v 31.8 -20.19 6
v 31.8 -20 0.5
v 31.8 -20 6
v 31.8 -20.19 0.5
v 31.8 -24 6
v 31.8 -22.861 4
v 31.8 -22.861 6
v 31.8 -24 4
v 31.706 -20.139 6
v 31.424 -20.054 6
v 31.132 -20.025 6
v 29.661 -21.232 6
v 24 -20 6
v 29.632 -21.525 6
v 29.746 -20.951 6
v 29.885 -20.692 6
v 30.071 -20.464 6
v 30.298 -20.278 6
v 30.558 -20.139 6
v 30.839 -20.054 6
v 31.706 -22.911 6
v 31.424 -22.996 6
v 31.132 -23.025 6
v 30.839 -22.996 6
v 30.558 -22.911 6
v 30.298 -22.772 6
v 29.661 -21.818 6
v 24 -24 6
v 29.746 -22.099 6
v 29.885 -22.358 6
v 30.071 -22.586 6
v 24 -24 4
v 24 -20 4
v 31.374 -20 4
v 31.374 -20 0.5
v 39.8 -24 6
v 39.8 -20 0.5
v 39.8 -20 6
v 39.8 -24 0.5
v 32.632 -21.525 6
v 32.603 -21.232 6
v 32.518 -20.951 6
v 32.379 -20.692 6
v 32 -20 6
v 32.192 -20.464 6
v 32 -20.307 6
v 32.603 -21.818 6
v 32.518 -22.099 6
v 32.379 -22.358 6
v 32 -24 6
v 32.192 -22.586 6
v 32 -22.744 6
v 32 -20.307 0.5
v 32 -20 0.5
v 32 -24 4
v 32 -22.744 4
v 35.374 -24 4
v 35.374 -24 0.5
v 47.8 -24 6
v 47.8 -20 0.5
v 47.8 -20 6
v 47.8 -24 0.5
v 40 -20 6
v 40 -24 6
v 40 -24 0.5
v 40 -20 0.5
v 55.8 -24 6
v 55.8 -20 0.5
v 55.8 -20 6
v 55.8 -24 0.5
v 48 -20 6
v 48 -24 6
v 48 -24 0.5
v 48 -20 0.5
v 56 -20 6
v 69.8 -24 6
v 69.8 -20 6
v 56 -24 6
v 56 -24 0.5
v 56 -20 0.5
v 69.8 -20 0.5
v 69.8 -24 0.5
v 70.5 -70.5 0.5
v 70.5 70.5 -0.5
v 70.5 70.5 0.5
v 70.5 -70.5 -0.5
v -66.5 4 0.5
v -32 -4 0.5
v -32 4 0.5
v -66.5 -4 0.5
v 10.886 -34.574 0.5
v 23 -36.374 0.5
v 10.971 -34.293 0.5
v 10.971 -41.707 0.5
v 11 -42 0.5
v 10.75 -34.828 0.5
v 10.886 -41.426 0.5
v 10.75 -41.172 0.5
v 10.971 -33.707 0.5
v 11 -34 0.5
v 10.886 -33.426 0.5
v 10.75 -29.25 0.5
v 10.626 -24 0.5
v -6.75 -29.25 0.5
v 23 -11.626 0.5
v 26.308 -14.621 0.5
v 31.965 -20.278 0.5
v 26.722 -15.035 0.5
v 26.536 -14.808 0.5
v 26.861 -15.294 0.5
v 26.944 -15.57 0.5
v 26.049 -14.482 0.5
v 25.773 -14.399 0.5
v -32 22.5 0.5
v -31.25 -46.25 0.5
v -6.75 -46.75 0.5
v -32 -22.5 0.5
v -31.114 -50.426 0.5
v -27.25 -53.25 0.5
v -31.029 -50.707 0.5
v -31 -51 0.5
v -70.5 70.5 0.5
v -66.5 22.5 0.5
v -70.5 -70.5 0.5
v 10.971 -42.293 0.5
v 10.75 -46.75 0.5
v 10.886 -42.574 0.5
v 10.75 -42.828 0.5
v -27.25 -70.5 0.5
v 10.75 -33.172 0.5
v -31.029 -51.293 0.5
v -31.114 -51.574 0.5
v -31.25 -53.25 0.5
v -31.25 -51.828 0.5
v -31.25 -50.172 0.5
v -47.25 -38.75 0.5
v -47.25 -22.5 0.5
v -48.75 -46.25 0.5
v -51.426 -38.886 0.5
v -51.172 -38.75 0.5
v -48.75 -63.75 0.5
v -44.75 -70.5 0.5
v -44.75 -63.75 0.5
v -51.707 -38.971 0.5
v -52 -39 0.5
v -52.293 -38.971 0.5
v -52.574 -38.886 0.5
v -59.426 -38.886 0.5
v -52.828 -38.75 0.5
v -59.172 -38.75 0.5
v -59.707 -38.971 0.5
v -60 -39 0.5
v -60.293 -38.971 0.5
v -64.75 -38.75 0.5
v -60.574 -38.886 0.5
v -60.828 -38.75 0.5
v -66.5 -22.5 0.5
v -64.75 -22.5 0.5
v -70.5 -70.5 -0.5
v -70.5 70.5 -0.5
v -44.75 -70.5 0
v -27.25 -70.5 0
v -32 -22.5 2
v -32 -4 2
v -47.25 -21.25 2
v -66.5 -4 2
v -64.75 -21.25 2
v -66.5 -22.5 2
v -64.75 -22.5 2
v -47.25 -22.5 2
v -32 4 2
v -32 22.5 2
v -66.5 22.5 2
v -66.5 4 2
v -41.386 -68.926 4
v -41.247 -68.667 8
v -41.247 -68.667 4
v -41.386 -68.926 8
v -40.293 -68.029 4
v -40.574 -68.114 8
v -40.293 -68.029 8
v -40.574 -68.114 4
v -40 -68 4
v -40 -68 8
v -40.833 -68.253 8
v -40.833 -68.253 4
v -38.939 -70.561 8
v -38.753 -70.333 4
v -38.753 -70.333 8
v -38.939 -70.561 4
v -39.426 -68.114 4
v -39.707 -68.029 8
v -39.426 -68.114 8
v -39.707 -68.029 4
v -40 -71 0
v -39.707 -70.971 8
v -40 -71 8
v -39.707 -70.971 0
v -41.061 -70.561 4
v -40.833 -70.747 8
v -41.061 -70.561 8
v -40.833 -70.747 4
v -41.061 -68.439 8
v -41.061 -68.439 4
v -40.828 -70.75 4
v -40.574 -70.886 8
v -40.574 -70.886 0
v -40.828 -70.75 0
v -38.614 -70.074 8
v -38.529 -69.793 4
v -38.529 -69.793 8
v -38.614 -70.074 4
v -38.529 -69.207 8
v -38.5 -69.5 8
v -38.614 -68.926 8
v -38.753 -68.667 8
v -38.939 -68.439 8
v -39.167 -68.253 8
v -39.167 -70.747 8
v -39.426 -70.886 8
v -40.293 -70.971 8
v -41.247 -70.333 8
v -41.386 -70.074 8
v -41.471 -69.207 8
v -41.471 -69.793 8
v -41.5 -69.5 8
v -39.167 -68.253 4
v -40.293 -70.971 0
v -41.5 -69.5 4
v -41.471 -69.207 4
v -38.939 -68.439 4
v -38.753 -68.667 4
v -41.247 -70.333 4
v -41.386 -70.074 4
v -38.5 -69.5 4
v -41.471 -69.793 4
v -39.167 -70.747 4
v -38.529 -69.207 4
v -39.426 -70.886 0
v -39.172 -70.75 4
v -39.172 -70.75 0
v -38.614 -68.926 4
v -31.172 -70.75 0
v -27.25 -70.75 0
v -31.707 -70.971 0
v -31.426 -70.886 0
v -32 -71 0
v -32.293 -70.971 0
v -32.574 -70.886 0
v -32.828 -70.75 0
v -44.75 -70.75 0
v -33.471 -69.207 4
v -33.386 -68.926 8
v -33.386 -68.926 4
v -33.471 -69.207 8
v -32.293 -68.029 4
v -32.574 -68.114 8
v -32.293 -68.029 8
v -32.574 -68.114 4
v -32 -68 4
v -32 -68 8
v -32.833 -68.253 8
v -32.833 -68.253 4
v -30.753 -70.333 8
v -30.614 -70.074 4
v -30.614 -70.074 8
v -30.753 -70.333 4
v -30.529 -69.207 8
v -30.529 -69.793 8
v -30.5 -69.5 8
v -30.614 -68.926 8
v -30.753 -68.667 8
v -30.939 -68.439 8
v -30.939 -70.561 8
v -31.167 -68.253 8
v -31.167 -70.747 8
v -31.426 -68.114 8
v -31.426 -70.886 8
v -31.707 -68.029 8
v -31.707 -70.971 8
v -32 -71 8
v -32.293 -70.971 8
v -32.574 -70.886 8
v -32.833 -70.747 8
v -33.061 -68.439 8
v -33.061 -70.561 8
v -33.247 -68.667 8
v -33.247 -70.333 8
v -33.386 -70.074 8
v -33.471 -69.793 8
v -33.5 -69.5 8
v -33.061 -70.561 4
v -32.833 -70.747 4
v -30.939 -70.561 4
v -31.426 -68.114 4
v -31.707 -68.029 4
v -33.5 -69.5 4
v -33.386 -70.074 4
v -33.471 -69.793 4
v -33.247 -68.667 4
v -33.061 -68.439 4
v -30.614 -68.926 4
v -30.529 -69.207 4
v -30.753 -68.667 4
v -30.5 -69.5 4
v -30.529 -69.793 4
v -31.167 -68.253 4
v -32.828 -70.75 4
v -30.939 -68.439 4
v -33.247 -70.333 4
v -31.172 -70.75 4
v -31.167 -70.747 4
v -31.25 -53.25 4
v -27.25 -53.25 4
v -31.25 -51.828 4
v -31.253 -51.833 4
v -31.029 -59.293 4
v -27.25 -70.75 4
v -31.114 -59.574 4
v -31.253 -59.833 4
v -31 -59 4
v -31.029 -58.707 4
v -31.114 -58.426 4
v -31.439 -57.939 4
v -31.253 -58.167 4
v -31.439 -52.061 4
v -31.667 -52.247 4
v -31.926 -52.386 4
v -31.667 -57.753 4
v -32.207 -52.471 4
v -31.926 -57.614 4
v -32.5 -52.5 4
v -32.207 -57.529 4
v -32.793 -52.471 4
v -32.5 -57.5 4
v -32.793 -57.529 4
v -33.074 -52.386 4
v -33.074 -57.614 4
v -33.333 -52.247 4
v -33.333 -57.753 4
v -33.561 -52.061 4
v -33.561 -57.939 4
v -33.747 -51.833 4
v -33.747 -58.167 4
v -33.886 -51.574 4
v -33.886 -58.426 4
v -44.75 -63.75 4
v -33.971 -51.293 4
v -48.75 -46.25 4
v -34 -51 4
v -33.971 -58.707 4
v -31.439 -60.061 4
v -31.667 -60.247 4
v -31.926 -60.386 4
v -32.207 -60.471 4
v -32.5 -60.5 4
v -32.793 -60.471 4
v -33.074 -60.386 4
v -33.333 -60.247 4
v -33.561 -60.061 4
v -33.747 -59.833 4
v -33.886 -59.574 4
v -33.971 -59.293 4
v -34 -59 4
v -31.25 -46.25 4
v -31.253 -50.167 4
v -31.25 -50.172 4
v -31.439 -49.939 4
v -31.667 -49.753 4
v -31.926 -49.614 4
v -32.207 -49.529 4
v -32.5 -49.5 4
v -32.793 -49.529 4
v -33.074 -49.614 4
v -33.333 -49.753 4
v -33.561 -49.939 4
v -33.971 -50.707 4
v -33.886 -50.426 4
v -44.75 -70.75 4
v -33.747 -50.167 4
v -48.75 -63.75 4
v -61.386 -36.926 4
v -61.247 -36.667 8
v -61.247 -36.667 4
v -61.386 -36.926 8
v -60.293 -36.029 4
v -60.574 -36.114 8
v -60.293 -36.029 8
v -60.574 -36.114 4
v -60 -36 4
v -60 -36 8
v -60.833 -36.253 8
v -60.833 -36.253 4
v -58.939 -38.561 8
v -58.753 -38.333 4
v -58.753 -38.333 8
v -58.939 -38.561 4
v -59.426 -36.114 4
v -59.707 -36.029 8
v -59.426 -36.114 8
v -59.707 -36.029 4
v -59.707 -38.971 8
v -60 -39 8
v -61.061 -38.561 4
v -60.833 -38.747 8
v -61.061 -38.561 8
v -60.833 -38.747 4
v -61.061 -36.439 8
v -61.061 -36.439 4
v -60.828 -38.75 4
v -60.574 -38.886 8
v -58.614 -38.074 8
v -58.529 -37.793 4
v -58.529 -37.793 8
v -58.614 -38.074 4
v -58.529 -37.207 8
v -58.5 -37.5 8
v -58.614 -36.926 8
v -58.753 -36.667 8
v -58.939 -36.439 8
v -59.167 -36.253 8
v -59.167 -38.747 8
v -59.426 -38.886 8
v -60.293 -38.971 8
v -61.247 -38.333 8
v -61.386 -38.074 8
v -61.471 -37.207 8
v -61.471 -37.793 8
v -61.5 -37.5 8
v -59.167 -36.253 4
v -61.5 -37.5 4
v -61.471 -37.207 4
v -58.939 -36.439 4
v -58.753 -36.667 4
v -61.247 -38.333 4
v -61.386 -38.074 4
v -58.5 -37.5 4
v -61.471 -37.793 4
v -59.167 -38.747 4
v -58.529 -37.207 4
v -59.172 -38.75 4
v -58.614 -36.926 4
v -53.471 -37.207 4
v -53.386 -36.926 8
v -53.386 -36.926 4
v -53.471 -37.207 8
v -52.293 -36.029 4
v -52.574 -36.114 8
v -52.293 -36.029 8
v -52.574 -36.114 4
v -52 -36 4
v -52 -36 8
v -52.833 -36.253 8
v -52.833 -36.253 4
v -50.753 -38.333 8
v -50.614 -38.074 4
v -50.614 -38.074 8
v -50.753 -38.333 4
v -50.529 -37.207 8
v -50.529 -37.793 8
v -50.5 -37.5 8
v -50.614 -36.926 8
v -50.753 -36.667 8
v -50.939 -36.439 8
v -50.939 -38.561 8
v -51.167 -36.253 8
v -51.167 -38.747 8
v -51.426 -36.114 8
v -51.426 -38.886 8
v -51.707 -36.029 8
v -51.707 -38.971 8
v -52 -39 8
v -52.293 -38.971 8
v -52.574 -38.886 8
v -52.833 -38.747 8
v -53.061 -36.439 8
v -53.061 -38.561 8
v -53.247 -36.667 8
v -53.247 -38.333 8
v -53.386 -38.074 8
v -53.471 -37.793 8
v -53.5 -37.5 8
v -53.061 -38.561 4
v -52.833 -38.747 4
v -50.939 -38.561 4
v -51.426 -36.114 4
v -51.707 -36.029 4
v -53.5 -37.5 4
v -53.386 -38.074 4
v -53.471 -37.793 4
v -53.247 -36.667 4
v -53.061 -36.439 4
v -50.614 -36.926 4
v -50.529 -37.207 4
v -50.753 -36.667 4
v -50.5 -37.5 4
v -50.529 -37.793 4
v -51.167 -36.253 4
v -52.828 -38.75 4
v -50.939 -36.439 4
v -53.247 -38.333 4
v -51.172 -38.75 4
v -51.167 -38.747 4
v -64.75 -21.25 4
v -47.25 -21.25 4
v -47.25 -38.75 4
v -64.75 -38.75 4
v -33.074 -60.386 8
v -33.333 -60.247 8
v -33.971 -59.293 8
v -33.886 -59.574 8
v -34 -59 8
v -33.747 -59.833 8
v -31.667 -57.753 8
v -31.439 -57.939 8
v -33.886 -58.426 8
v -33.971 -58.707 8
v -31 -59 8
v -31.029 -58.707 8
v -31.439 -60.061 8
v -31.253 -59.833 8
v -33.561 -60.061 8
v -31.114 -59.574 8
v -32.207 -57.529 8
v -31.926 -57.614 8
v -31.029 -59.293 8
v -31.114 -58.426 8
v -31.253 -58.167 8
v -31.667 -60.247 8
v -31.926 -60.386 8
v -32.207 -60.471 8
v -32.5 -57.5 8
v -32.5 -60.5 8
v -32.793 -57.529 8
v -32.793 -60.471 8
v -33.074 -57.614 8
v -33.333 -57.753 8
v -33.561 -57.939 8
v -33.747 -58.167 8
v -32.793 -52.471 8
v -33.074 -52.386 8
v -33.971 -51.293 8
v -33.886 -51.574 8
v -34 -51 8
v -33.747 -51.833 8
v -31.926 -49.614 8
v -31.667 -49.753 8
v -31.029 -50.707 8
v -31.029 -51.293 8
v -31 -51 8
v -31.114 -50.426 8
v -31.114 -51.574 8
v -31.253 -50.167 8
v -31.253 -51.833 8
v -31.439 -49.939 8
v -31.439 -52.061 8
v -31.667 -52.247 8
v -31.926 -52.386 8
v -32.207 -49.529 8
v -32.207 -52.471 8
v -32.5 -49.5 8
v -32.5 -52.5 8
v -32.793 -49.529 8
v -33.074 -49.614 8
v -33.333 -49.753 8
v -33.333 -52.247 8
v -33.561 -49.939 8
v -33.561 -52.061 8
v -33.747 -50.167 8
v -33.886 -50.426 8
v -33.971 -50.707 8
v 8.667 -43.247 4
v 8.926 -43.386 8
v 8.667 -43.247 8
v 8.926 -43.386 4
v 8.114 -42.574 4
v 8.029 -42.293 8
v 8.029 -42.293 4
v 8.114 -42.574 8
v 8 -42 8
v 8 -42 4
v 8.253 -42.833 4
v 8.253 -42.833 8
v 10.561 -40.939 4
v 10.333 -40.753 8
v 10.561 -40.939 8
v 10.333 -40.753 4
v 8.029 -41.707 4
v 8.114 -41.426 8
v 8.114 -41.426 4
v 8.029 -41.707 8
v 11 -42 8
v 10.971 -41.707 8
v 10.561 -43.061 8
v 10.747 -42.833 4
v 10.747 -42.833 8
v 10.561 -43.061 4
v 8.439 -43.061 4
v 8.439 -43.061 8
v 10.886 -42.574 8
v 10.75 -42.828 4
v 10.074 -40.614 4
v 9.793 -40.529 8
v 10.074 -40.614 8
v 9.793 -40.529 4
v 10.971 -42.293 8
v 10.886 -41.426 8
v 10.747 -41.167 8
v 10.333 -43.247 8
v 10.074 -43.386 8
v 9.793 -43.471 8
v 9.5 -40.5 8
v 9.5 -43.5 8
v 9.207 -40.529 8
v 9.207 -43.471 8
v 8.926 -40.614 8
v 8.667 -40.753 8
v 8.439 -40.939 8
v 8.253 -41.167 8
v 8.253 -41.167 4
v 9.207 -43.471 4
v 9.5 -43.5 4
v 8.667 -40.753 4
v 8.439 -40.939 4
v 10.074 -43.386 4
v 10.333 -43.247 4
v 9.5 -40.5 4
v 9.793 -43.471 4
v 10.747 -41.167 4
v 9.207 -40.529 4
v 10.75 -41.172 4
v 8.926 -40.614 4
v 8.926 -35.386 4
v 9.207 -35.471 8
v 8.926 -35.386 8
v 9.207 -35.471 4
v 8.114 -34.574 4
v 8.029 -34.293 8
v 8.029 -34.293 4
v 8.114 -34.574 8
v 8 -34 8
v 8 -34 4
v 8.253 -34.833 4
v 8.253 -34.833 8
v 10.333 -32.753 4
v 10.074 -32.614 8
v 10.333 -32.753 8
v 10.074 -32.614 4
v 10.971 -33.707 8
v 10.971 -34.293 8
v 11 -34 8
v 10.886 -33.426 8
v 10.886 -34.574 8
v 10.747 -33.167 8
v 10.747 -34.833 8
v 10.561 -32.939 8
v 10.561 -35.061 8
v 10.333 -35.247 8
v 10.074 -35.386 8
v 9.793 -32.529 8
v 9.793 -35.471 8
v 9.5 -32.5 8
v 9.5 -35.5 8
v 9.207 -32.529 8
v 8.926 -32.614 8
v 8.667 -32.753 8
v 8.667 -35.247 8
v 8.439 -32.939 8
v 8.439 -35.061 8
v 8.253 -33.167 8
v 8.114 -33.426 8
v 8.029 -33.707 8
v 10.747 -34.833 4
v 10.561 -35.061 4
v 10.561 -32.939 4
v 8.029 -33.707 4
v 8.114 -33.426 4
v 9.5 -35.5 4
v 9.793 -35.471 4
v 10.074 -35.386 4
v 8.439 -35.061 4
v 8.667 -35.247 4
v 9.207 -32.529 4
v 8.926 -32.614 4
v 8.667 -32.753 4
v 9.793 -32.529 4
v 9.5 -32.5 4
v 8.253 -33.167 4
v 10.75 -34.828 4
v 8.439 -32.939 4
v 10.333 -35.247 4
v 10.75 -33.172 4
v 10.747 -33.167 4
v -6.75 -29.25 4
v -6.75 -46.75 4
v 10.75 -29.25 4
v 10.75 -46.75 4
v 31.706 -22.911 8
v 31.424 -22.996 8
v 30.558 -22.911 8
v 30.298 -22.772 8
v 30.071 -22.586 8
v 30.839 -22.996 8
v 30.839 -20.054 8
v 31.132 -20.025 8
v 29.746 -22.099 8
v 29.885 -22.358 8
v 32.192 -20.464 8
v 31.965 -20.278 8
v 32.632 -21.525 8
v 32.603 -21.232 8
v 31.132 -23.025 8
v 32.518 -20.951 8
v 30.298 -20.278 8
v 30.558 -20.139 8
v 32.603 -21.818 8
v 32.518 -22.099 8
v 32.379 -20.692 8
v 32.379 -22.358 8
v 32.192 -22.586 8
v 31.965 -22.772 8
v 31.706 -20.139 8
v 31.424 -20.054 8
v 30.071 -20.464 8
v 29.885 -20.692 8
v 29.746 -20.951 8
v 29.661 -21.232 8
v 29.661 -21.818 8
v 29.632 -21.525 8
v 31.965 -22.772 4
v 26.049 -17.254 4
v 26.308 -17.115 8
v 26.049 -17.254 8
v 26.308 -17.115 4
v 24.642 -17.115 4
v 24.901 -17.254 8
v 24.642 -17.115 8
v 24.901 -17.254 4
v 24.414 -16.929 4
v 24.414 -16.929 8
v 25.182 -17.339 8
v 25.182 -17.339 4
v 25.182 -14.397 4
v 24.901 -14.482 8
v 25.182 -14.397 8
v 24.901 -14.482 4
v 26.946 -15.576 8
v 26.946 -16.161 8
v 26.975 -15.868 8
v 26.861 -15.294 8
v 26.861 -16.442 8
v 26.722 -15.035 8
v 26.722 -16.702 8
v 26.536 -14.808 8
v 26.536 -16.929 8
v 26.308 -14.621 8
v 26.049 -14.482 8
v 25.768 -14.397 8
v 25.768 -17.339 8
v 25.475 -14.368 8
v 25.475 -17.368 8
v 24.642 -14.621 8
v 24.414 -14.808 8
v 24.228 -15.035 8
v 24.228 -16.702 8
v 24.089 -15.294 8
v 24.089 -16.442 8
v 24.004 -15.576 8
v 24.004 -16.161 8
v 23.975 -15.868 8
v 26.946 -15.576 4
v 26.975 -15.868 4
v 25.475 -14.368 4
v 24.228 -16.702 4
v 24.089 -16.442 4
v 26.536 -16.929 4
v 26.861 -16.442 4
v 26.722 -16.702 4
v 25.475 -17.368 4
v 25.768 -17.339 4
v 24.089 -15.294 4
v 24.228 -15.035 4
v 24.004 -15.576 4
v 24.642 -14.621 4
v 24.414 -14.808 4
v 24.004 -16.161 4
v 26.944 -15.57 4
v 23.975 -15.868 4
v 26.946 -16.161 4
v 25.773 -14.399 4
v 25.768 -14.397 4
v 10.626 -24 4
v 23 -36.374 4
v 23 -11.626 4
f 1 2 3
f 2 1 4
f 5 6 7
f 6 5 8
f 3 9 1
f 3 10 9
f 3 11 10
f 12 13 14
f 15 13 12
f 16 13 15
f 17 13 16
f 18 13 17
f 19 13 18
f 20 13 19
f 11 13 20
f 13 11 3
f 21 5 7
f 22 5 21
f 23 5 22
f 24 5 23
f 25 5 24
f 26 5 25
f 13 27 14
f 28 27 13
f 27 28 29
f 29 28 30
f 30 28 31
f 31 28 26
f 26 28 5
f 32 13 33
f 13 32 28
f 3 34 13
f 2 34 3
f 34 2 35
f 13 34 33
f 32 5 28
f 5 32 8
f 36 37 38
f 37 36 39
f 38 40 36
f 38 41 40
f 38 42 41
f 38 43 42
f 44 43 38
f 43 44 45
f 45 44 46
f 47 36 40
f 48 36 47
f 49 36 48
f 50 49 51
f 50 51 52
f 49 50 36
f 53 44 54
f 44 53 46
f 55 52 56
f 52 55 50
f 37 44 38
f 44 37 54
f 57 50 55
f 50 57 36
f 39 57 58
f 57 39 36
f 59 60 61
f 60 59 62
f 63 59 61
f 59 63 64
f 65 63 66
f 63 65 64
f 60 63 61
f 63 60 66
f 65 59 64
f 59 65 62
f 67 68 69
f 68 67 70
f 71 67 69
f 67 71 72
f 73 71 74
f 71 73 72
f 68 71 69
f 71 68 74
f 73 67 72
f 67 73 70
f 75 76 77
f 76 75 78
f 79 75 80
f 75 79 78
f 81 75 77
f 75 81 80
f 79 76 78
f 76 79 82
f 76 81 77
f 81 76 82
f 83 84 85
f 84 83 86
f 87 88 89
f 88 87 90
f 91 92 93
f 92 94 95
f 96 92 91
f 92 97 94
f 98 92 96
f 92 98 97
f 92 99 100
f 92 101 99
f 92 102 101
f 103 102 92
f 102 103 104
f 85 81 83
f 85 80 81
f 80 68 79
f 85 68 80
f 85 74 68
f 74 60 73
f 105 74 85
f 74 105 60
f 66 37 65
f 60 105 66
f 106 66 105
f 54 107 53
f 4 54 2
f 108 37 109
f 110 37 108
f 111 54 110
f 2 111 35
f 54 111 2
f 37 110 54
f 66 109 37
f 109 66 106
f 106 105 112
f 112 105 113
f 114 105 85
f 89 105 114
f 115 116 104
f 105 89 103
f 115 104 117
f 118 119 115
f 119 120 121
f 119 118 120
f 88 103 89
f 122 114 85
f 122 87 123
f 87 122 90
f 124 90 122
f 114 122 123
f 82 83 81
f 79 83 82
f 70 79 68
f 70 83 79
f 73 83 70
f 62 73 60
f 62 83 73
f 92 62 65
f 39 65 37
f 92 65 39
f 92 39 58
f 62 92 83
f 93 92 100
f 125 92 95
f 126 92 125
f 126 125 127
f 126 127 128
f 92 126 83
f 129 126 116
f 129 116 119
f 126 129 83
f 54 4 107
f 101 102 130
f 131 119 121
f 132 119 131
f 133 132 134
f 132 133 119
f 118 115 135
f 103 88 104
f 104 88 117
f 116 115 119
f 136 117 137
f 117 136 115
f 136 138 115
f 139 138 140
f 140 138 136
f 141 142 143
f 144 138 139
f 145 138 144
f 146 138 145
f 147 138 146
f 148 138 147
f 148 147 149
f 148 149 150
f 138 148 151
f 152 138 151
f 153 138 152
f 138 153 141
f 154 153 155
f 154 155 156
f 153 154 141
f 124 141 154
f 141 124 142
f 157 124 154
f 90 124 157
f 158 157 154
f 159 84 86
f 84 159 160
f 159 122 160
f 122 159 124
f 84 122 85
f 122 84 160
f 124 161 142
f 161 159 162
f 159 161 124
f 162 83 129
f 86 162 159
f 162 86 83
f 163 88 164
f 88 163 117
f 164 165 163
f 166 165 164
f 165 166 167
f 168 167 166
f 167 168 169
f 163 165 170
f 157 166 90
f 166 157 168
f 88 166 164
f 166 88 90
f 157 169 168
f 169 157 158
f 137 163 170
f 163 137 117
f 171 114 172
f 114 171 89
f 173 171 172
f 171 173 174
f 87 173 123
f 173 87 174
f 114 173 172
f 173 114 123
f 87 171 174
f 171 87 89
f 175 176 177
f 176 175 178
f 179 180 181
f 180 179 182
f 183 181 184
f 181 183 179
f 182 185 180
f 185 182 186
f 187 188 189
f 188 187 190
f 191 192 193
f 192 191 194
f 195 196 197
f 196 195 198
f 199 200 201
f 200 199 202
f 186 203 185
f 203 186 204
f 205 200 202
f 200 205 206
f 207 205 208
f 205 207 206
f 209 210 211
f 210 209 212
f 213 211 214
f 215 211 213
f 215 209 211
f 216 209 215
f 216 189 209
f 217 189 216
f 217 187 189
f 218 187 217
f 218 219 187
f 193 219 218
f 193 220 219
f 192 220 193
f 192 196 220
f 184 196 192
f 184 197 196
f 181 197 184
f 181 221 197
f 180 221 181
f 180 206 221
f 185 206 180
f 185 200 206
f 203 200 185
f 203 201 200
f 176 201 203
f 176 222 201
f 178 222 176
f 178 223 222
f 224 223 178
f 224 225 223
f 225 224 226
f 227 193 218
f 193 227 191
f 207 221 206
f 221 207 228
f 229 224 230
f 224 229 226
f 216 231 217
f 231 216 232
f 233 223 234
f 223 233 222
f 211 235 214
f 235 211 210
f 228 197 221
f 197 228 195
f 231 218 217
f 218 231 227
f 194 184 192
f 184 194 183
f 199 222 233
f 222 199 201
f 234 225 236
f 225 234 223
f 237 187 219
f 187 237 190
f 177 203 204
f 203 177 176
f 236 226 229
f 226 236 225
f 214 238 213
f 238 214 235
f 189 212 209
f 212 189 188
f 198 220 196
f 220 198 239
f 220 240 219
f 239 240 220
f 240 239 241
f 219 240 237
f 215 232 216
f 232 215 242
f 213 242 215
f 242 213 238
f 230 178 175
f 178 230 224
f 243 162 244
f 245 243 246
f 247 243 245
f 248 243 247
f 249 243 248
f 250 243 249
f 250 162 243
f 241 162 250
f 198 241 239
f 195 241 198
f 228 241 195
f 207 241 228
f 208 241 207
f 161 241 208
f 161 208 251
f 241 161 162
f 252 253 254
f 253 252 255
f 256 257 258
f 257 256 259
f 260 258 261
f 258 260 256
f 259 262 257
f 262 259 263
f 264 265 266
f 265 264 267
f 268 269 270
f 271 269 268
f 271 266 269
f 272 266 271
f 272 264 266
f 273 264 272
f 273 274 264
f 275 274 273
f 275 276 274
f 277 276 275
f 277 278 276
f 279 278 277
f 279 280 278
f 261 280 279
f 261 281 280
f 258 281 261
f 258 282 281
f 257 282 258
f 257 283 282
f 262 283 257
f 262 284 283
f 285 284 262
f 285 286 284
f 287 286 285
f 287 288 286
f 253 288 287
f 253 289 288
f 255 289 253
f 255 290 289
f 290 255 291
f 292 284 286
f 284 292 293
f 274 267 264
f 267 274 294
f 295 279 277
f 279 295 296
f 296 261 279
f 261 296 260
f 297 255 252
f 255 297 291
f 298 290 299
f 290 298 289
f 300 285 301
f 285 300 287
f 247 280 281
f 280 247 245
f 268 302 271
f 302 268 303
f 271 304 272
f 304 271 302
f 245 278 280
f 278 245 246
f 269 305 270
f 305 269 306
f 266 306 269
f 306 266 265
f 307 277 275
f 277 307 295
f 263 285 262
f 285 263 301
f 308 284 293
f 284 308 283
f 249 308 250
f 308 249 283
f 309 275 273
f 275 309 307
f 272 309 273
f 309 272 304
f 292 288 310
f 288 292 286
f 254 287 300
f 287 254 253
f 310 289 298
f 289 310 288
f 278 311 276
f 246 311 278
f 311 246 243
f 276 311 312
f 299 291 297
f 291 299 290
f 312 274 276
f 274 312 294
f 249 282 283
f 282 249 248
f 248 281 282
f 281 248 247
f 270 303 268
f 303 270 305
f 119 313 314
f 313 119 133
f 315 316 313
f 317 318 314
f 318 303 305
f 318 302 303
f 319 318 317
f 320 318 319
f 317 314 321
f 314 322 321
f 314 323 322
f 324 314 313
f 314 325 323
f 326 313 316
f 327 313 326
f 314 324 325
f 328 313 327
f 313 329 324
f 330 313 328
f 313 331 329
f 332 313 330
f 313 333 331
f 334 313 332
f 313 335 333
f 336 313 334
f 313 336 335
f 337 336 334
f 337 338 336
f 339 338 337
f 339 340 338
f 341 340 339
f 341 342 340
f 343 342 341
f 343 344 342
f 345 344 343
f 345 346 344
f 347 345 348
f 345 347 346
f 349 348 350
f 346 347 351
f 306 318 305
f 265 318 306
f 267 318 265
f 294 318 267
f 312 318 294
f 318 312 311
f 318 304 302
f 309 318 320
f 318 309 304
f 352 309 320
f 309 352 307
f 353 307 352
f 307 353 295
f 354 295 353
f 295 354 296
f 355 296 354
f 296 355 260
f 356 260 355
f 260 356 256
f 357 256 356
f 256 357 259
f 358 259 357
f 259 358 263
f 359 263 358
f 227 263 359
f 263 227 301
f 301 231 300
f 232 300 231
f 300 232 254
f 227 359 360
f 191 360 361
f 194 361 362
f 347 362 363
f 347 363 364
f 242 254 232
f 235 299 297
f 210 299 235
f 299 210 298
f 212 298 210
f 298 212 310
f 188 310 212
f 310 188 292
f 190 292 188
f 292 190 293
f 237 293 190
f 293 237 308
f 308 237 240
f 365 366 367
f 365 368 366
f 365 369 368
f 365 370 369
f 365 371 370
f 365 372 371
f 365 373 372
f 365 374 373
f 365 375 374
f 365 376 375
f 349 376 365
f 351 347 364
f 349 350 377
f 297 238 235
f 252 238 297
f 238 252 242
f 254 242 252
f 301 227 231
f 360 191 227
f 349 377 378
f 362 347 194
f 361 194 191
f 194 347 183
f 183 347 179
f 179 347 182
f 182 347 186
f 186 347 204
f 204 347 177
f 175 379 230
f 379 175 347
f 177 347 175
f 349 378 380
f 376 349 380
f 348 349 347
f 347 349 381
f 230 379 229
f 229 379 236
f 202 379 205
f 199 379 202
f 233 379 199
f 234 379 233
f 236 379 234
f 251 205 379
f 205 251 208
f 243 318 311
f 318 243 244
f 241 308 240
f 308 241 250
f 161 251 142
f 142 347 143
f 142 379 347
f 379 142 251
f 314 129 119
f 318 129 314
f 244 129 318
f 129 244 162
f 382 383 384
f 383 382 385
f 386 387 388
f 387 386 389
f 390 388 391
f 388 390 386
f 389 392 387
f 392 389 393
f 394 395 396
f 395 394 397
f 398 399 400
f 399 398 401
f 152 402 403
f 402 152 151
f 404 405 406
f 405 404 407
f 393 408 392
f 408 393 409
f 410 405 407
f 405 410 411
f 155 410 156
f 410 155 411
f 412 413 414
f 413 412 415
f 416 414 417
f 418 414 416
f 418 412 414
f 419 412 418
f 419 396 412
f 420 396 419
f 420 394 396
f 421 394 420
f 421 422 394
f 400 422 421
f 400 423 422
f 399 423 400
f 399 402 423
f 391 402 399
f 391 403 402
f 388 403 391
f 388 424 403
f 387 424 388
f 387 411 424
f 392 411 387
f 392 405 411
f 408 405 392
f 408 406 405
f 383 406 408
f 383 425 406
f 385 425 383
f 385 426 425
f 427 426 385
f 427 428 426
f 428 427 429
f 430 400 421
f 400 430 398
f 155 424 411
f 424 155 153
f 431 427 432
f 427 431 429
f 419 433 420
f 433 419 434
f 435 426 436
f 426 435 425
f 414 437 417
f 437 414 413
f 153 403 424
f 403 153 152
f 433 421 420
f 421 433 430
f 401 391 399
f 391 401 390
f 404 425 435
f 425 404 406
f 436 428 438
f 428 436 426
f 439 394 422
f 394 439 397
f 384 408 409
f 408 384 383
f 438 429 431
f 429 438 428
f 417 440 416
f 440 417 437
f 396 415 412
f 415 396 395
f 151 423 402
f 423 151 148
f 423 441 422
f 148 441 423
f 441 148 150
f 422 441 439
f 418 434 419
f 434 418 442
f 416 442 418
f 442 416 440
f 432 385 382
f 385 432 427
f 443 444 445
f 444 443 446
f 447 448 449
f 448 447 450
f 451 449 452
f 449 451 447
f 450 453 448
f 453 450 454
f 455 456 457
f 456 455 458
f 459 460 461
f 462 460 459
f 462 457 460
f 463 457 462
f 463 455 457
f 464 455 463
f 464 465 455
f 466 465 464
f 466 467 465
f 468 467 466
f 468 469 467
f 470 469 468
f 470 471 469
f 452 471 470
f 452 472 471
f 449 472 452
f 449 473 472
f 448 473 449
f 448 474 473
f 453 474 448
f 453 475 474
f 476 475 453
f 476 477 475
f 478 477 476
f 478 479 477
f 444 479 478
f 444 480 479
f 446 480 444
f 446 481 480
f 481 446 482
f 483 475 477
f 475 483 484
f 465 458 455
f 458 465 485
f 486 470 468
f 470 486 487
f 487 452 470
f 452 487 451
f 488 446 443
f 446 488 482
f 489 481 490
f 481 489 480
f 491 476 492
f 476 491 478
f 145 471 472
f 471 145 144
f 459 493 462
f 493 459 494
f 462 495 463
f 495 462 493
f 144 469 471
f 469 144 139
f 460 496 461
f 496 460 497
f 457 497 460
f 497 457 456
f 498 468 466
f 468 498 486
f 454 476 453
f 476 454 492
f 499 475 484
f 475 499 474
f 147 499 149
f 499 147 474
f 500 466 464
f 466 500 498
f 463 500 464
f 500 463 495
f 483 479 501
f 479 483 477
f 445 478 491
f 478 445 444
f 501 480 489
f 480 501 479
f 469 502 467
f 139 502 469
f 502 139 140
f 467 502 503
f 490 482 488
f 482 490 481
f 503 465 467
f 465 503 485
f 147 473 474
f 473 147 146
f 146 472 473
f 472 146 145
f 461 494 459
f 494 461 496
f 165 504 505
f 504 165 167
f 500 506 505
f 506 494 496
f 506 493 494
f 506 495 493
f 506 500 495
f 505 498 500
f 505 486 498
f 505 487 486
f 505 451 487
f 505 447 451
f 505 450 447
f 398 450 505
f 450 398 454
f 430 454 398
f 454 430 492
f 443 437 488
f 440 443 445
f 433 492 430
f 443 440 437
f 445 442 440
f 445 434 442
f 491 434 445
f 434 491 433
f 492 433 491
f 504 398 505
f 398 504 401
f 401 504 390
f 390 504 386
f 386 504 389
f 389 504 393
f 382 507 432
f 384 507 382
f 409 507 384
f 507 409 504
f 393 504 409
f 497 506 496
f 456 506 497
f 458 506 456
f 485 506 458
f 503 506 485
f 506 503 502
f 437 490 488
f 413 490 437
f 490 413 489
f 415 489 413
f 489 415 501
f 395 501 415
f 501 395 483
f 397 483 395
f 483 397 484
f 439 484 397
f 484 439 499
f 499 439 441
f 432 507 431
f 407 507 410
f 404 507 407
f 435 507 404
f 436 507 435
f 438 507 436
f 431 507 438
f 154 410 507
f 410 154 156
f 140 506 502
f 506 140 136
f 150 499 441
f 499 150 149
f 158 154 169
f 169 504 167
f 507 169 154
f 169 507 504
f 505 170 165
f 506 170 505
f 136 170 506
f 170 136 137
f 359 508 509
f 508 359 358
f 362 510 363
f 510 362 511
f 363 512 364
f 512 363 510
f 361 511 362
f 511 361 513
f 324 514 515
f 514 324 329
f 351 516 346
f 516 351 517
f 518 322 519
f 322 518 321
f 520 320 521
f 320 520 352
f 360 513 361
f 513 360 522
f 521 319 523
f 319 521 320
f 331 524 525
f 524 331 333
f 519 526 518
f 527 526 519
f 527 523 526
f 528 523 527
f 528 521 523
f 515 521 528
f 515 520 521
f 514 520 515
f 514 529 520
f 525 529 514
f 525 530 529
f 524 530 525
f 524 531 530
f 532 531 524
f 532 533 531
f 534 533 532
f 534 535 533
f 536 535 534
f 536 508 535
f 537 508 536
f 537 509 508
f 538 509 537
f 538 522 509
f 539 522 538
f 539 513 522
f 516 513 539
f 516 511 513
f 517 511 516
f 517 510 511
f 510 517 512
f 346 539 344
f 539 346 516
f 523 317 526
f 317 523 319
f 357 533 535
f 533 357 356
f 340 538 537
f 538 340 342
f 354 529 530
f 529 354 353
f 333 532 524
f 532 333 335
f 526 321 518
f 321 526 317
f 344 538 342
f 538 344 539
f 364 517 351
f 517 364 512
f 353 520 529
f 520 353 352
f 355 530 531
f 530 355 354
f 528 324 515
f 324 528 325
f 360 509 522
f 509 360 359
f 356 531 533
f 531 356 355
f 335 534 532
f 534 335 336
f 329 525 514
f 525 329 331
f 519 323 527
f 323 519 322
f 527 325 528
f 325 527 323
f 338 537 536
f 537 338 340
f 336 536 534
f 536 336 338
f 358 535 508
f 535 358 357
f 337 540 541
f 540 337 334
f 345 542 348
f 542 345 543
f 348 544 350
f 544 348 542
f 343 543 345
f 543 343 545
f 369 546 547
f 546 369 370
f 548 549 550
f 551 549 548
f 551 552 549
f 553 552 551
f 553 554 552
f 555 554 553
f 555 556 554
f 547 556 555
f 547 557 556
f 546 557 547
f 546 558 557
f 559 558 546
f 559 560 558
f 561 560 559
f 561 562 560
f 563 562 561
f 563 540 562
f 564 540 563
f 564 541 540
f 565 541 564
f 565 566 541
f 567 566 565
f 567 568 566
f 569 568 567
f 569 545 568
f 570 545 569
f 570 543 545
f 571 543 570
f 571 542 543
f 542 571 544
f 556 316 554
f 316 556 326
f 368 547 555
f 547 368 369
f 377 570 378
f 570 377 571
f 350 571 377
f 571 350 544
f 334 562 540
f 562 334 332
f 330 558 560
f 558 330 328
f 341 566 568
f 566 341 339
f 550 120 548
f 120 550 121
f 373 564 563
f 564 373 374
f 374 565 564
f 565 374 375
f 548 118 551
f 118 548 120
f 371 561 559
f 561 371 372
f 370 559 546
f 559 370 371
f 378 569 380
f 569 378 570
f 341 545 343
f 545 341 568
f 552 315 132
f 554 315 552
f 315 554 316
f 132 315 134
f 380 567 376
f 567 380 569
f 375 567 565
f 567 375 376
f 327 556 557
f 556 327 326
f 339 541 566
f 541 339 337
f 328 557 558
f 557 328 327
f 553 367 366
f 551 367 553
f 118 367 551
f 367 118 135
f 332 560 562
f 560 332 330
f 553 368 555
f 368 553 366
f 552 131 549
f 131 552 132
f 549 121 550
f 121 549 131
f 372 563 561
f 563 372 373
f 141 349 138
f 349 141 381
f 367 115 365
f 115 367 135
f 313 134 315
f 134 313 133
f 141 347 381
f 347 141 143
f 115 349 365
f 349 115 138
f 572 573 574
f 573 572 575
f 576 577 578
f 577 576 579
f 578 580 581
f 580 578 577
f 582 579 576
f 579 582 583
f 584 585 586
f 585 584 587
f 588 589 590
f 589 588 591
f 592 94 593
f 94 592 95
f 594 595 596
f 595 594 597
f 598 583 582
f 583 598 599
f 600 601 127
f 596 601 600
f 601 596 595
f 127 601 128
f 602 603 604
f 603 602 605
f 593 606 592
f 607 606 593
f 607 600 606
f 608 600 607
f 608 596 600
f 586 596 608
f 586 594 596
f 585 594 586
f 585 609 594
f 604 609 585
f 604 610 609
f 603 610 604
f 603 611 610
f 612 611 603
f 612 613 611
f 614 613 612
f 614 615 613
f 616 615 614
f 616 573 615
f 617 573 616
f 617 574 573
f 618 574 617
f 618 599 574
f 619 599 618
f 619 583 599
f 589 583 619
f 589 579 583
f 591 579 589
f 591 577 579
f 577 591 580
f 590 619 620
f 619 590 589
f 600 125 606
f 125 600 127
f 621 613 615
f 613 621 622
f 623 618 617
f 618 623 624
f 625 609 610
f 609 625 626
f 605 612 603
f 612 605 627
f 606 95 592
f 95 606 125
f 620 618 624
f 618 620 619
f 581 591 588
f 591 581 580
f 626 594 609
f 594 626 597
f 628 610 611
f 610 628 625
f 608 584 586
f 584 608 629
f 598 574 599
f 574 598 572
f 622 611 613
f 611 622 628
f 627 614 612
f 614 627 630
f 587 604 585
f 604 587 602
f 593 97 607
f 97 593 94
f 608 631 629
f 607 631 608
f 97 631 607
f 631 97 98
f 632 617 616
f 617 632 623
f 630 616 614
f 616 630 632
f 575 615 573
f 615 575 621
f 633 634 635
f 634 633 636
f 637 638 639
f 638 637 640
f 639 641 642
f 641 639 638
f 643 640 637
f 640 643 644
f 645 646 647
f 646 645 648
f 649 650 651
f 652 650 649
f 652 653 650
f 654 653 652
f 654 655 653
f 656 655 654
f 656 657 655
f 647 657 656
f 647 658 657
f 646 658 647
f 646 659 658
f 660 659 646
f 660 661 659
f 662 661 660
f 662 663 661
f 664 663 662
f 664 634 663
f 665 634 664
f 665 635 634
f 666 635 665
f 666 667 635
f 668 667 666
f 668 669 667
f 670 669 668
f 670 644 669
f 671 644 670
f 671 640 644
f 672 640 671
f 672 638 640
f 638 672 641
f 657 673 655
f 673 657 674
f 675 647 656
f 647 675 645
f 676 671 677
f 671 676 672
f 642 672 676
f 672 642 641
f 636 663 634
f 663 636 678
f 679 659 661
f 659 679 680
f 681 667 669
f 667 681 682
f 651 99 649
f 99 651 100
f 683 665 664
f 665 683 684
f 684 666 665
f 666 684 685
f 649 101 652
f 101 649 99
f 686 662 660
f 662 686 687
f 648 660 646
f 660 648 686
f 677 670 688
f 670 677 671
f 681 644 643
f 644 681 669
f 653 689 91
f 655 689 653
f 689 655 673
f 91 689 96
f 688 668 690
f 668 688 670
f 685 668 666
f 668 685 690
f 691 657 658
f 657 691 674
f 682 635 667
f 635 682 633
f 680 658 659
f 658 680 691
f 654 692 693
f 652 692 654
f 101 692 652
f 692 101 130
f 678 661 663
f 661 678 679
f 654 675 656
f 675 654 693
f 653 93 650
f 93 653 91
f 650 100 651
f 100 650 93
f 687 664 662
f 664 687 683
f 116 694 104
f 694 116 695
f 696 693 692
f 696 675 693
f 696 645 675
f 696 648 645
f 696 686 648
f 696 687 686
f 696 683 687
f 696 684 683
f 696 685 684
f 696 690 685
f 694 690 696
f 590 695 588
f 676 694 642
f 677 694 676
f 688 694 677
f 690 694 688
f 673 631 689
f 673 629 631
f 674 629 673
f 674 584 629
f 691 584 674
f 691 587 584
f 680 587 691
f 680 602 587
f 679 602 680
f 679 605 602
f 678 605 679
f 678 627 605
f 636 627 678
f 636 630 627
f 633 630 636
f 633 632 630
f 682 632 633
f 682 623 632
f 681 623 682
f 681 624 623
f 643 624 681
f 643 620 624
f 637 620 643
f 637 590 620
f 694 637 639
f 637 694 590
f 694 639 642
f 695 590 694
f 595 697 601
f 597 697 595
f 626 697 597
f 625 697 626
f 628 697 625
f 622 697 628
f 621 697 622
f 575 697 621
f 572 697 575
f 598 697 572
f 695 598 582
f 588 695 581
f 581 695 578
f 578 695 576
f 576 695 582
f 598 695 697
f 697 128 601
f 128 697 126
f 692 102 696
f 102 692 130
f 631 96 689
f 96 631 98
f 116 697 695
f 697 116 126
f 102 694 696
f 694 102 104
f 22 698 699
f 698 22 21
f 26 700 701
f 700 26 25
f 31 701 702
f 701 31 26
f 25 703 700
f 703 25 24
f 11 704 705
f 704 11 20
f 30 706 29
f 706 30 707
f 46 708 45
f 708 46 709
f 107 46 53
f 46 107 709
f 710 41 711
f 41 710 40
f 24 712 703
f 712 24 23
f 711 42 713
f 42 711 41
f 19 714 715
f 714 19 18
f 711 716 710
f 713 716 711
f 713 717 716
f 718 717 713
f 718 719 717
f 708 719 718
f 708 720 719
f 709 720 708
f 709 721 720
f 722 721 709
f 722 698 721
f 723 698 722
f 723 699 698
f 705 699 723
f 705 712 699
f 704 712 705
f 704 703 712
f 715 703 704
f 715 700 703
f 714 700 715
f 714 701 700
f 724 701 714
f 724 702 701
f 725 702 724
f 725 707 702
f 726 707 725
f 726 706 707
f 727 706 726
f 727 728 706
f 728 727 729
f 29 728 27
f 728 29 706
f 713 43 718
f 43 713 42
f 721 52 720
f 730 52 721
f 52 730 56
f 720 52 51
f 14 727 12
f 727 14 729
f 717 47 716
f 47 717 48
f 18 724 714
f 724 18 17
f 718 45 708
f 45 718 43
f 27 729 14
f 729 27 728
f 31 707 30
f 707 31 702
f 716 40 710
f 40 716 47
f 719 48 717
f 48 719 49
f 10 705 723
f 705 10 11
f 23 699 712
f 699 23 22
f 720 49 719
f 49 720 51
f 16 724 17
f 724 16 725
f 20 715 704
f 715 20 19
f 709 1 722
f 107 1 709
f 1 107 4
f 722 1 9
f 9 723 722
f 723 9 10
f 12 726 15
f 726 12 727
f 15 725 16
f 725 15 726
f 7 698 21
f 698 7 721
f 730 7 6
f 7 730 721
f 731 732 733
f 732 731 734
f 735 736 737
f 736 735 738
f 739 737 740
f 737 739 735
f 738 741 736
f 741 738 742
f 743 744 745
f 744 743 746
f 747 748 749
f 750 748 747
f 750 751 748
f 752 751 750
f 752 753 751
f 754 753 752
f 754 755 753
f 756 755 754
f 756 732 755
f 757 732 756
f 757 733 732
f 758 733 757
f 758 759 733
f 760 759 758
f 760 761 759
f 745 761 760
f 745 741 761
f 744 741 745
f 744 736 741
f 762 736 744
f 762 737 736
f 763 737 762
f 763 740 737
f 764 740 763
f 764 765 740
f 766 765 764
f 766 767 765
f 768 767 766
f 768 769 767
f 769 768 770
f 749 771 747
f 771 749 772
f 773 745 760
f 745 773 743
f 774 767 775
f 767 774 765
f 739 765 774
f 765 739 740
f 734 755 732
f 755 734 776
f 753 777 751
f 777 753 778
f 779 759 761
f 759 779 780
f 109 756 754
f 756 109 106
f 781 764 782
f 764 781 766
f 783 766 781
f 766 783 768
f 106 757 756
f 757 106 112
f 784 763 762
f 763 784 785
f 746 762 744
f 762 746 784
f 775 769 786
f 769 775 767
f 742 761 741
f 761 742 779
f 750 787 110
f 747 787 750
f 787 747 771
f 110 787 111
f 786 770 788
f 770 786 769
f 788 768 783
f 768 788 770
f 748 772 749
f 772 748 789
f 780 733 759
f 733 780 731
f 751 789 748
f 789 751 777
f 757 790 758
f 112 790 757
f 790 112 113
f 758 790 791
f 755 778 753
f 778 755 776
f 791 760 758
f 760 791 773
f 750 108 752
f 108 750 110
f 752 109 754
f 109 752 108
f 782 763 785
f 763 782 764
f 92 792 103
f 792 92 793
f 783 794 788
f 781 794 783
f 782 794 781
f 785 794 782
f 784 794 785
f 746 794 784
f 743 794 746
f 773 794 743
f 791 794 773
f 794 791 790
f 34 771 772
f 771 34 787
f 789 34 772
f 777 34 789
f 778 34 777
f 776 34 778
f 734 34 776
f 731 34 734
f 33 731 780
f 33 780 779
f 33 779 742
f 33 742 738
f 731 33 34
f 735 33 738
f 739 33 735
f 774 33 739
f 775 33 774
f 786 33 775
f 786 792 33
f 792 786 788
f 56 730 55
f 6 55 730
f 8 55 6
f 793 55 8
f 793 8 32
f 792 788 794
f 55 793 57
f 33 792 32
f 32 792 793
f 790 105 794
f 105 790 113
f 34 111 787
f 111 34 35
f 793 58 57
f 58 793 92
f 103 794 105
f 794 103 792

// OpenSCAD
// FTC Auto Planning Tool
// Skystone field
// SrAmo June, 2023

module field() {
    color("grey") cube([141,141,1],center=true);
    
    color("blue") 
        translate([-141/2+4+34.5/2,-18.5/2-4,1]) 
        cube([34.5,18.5,2],center=true);
    
    color("red") 
        translate([-141/2+4+34.5/2,18.5/2+4,1]) 
        cube([34.5,18.5,2],center=true);
    
    color("yellow") {
        translate([24,-24-0,0]) cube([7.8,4,6],center=false);
        translate([32,-24-0,0]) cube([7.8,4,6],center=false);
        translate([40,-24-0,0]) cube([7.8,4,6],center=false);
        translate([48,-24-0,0]) cube([7.8,4,6],center=false);
        translate([56,-24-0,0]) cube([7.8,4,6],center=false);
        translate([62,-24-0,0]) cube([7.8,4,6],center=false);
    }
    *color("yellow") 
        translate([0,0,0]) cube([8,4,6],center=false);
    
}
module robot() {
    color("silver") // Chassis
        translate([0,0,2]) cube([17.5,17.5,4],center=true);
    color("green") { // intakes
        translate([-7.5,4,4]) cylinder(h=8,d=3,center=true,$fn=32);
        translate([-7.5,-4,4]) cylinder(h=8,d=3,center=true,$fn=32);
    }
}
field();

translate([-36,-62,0]) rotate([0,0,90]) robot(); // startPose

translate([-56,-30,0]) rotate([0,0,90]) robot(); // PLAT_POINT

translate([-40,-55,0]) rotate([0,0,180]) robot(); // PLAT_POINT_2

translate([2,-38,0]) rotate([0,0,180]) robot(); // MID_POINT

translate([23,-24,0]) rotate([0,0,225]) robot(); // BLOCK_POINT
